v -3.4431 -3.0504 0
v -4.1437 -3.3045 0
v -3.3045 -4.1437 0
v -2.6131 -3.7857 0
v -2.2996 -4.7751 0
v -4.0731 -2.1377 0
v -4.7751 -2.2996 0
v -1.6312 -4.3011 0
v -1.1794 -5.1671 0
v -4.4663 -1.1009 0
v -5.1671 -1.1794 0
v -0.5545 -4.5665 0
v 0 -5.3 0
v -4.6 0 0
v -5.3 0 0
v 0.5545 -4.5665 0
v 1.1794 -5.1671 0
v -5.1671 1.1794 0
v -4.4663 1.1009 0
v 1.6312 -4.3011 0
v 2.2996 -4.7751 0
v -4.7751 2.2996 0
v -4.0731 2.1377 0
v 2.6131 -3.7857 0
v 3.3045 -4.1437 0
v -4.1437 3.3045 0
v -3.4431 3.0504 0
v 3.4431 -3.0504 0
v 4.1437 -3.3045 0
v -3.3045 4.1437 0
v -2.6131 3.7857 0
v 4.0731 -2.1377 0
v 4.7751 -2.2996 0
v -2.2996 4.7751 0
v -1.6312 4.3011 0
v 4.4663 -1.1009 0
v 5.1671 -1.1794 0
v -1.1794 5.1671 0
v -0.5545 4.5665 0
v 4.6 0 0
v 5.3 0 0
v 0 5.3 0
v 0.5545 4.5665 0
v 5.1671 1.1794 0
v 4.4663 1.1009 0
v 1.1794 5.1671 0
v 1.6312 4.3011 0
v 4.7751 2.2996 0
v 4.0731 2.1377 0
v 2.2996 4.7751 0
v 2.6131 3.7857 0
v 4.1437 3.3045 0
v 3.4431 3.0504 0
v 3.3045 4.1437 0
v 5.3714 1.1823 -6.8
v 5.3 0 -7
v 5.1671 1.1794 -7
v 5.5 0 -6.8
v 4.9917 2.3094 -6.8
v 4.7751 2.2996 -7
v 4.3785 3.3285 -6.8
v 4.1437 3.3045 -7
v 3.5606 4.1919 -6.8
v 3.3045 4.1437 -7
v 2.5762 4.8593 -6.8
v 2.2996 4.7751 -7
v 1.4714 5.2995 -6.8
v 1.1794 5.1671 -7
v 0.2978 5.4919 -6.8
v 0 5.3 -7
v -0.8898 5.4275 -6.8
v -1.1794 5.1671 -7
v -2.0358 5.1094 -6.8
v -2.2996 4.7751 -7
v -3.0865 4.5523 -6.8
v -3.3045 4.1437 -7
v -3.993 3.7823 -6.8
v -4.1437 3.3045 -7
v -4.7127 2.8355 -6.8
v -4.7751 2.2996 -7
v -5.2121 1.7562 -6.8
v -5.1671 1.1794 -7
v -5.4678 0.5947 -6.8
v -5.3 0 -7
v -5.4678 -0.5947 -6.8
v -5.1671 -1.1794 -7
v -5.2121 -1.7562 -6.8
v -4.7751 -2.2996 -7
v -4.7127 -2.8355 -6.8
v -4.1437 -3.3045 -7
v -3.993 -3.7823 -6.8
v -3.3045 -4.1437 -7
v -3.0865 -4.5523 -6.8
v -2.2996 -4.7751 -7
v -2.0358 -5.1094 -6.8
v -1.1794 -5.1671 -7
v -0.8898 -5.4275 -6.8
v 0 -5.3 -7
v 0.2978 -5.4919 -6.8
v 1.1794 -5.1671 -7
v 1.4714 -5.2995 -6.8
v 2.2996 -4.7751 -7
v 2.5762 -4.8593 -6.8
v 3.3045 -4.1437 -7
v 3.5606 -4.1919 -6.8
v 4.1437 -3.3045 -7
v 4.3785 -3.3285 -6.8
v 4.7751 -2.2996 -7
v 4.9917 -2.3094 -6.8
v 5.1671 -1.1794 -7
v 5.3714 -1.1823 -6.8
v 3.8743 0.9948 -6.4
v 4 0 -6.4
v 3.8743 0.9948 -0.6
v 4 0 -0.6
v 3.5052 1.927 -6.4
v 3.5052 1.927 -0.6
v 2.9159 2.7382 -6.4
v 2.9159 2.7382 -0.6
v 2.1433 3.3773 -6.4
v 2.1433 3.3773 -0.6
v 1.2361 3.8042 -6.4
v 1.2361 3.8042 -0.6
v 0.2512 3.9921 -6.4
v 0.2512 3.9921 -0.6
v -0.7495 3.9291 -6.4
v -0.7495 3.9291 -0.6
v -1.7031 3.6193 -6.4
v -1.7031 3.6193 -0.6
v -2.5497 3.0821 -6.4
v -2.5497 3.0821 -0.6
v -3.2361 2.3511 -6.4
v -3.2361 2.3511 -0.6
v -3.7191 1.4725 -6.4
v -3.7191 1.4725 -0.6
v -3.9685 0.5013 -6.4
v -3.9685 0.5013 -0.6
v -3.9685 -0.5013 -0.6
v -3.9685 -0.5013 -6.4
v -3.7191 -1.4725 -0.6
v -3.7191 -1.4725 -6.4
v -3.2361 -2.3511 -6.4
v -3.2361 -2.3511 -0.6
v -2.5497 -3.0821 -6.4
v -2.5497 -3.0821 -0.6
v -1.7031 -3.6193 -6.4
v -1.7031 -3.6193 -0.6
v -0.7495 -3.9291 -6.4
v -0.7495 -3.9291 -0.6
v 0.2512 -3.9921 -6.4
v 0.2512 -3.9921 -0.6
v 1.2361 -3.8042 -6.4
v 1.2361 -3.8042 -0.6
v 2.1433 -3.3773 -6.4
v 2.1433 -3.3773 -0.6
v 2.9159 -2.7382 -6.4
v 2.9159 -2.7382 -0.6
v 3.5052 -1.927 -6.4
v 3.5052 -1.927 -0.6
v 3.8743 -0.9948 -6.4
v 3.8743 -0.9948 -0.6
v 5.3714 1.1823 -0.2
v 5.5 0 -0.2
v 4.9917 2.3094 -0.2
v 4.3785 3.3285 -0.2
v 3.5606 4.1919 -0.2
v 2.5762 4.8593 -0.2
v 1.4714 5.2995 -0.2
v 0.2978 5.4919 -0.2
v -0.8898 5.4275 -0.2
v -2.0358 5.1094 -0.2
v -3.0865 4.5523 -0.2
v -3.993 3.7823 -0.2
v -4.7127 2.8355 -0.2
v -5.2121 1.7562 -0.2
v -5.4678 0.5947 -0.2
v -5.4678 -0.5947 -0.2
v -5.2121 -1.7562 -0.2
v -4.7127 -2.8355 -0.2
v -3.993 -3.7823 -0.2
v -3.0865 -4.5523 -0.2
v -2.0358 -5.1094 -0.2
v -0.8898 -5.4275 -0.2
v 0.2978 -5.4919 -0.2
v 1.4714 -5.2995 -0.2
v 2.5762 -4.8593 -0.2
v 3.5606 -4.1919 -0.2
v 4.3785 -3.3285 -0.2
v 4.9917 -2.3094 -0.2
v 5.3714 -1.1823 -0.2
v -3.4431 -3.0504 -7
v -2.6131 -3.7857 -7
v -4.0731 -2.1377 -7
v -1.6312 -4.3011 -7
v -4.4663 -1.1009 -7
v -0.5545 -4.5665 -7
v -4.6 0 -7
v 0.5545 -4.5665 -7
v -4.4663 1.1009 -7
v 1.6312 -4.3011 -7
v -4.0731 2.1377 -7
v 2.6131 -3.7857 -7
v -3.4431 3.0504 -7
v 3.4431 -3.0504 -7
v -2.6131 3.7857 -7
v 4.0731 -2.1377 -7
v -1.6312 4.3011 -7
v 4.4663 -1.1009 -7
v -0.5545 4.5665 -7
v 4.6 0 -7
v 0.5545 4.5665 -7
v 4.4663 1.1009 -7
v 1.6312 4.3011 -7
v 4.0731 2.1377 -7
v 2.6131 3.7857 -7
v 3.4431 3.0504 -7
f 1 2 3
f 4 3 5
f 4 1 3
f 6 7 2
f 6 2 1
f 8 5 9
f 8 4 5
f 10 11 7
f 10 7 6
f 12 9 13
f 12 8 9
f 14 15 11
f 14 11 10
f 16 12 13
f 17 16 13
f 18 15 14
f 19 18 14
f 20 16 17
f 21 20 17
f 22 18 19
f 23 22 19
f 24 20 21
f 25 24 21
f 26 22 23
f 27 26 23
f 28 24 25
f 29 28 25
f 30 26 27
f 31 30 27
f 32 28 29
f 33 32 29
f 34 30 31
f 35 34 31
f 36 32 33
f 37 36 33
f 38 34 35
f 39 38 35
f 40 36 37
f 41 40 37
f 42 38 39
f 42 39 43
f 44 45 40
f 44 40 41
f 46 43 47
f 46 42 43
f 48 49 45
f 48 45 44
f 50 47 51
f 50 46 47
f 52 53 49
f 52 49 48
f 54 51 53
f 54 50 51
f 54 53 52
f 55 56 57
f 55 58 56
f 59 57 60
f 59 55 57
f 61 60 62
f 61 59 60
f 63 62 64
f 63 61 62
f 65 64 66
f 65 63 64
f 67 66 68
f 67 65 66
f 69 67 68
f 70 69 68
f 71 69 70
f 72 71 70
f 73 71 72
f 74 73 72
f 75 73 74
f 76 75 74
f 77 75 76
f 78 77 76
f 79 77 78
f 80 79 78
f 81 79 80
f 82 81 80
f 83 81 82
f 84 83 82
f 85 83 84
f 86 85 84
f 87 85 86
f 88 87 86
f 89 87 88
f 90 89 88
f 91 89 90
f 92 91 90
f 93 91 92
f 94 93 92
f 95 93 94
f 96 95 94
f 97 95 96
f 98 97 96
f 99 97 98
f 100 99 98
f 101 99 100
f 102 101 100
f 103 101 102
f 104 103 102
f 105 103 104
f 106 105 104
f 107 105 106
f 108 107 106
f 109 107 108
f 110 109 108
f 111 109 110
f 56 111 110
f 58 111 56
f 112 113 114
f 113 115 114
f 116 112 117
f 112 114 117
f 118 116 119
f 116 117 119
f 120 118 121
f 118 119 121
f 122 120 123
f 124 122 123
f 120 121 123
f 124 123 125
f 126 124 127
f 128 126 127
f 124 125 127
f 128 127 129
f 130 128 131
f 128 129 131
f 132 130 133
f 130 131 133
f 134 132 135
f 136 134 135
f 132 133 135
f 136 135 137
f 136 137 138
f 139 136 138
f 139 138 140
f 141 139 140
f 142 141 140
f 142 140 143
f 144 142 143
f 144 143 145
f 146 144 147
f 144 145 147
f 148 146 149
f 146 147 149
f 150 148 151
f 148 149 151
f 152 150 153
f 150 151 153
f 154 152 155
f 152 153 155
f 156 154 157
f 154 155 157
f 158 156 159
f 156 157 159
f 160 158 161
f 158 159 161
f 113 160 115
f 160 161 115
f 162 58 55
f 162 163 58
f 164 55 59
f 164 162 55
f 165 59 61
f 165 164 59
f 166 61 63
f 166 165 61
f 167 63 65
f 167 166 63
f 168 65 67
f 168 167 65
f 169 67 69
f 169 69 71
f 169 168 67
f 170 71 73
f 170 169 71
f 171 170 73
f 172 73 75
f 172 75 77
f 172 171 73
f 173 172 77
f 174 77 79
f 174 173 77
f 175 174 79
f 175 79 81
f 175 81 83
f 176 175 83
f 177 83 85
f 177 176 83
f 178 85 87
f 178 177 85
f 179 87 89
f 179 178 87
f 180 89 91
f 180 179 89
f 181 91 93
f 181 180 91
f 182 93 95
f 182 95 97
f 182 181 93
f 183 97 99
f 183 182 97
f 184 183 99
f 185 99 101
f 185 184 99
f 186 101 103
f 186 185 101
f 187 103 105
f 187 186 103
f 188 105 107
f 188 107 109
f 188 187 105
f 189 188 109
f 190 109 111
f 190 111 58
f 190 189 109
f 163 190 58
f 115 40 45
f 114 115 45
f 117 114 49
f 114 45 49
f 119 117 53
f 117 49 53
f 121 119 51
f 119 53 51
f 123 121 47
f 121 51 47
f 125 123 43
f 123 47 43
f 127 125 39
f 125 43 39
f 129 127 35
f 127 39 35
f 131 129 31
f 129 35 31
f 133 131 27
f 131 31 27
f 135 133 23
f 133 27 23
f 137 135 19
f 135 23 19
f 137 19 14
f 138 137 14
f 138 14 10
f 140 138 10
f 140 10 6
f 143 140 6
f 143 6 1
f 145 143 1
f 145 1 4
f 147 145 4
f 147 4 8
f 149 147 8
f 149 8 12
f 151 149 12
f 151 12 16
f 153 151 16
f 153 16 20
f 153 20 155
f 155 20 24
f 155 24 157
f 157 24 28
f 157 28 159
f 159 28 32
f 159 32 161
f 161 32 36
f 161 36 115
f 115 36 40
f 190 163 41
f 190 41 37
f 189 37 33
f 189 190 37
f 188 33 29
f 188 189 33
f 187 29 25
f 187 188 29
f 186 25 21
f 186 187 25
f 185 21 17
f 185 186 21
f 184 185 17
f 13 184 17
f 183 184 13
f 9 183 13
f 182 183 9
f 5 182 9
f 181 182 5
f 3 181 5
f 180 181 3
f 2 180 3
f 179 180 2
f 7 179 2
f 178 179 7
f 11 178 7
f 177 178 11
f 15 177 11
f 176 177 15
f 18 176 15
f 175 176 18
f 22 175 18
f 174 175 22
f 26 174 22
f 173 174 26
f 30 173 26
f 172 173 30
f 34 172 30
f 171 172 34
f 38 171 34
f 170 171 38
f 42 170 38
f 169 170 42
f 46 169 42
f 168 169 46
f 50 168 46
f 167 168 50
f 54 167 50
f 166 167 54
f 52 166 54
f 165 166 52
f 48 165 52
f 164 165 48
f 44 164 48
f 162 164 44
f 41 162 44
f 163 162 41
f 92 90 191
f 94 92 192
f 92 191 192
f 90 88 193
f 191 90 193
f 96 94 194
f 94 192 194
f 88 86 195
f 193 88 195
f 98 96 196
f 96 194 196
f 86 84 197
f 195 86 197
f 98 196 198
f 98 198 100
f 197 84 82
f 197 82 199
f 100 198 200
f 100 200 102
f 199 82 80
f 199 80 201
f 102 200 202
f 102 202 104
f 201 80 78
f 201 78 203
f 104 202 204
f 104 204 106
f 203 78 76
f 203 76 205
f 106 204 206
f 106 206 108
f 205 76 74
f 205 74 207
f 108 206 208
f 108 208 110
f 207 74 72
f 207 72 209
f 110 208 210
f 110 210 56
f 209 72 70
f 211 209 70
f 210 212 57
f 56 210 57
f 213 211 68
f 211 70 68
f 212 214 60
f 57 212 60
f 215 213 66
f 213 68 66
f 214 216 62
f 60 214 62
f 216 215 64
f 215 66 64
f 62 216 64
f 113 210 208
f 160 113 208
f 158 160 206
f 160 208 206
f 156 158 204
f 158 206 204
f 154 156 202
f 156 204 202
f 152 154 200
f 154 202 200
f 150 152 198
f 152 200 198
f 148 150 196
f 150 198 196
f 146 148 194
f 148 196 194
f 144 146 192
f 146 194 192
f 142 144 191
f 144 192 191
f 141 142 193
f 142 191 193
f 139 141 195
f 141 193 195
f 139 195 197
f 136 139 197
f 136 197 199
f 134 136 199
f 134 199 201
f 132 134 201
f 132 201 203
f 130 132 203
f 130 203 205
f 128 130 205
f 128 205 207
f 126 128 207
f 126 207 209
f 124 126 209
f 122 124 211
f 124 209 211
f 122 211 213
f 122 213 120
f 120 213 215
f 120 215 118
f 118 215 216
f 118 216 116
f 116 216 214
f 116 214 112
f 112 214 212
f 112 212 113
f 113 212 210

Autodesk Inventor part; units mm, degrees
ref_plane "YZ Plane" through (0, 0, 0) normal (1, 0, 0) x (0, 1, 0)
ref_plane "XZ Plane" through (0, 0, 0) normal (0, 1, 0) x (-1, 0, 0)
ref_plane "XY Plane" through (0, 0, 0) normal (0, 0, 1) x (1, 0, 0)
sketch "Sketch1" plane through (0, 0, 0) normal (0, 0, 1) x (1, 0, 0)
  circle A0 centre (0, 0) radius 5.5
  circle A1 centre (0, 0) radius 4
  dimension "d0" = 11
  dimension "d1" = 8
extrude "Extrusion1" add sketch "Sketch1" against normal blind 7
chamfer "Chamfer1" distance 0.6 angle 45 2 edges at (-4, 0, 0) (-4, 0, -7)
chamfer "Chamfer2" distance 0.2 angle 45 2 edges at (-5.5, 0, -7) (-5.5, 0, 0)
properties part number "608-inner"
